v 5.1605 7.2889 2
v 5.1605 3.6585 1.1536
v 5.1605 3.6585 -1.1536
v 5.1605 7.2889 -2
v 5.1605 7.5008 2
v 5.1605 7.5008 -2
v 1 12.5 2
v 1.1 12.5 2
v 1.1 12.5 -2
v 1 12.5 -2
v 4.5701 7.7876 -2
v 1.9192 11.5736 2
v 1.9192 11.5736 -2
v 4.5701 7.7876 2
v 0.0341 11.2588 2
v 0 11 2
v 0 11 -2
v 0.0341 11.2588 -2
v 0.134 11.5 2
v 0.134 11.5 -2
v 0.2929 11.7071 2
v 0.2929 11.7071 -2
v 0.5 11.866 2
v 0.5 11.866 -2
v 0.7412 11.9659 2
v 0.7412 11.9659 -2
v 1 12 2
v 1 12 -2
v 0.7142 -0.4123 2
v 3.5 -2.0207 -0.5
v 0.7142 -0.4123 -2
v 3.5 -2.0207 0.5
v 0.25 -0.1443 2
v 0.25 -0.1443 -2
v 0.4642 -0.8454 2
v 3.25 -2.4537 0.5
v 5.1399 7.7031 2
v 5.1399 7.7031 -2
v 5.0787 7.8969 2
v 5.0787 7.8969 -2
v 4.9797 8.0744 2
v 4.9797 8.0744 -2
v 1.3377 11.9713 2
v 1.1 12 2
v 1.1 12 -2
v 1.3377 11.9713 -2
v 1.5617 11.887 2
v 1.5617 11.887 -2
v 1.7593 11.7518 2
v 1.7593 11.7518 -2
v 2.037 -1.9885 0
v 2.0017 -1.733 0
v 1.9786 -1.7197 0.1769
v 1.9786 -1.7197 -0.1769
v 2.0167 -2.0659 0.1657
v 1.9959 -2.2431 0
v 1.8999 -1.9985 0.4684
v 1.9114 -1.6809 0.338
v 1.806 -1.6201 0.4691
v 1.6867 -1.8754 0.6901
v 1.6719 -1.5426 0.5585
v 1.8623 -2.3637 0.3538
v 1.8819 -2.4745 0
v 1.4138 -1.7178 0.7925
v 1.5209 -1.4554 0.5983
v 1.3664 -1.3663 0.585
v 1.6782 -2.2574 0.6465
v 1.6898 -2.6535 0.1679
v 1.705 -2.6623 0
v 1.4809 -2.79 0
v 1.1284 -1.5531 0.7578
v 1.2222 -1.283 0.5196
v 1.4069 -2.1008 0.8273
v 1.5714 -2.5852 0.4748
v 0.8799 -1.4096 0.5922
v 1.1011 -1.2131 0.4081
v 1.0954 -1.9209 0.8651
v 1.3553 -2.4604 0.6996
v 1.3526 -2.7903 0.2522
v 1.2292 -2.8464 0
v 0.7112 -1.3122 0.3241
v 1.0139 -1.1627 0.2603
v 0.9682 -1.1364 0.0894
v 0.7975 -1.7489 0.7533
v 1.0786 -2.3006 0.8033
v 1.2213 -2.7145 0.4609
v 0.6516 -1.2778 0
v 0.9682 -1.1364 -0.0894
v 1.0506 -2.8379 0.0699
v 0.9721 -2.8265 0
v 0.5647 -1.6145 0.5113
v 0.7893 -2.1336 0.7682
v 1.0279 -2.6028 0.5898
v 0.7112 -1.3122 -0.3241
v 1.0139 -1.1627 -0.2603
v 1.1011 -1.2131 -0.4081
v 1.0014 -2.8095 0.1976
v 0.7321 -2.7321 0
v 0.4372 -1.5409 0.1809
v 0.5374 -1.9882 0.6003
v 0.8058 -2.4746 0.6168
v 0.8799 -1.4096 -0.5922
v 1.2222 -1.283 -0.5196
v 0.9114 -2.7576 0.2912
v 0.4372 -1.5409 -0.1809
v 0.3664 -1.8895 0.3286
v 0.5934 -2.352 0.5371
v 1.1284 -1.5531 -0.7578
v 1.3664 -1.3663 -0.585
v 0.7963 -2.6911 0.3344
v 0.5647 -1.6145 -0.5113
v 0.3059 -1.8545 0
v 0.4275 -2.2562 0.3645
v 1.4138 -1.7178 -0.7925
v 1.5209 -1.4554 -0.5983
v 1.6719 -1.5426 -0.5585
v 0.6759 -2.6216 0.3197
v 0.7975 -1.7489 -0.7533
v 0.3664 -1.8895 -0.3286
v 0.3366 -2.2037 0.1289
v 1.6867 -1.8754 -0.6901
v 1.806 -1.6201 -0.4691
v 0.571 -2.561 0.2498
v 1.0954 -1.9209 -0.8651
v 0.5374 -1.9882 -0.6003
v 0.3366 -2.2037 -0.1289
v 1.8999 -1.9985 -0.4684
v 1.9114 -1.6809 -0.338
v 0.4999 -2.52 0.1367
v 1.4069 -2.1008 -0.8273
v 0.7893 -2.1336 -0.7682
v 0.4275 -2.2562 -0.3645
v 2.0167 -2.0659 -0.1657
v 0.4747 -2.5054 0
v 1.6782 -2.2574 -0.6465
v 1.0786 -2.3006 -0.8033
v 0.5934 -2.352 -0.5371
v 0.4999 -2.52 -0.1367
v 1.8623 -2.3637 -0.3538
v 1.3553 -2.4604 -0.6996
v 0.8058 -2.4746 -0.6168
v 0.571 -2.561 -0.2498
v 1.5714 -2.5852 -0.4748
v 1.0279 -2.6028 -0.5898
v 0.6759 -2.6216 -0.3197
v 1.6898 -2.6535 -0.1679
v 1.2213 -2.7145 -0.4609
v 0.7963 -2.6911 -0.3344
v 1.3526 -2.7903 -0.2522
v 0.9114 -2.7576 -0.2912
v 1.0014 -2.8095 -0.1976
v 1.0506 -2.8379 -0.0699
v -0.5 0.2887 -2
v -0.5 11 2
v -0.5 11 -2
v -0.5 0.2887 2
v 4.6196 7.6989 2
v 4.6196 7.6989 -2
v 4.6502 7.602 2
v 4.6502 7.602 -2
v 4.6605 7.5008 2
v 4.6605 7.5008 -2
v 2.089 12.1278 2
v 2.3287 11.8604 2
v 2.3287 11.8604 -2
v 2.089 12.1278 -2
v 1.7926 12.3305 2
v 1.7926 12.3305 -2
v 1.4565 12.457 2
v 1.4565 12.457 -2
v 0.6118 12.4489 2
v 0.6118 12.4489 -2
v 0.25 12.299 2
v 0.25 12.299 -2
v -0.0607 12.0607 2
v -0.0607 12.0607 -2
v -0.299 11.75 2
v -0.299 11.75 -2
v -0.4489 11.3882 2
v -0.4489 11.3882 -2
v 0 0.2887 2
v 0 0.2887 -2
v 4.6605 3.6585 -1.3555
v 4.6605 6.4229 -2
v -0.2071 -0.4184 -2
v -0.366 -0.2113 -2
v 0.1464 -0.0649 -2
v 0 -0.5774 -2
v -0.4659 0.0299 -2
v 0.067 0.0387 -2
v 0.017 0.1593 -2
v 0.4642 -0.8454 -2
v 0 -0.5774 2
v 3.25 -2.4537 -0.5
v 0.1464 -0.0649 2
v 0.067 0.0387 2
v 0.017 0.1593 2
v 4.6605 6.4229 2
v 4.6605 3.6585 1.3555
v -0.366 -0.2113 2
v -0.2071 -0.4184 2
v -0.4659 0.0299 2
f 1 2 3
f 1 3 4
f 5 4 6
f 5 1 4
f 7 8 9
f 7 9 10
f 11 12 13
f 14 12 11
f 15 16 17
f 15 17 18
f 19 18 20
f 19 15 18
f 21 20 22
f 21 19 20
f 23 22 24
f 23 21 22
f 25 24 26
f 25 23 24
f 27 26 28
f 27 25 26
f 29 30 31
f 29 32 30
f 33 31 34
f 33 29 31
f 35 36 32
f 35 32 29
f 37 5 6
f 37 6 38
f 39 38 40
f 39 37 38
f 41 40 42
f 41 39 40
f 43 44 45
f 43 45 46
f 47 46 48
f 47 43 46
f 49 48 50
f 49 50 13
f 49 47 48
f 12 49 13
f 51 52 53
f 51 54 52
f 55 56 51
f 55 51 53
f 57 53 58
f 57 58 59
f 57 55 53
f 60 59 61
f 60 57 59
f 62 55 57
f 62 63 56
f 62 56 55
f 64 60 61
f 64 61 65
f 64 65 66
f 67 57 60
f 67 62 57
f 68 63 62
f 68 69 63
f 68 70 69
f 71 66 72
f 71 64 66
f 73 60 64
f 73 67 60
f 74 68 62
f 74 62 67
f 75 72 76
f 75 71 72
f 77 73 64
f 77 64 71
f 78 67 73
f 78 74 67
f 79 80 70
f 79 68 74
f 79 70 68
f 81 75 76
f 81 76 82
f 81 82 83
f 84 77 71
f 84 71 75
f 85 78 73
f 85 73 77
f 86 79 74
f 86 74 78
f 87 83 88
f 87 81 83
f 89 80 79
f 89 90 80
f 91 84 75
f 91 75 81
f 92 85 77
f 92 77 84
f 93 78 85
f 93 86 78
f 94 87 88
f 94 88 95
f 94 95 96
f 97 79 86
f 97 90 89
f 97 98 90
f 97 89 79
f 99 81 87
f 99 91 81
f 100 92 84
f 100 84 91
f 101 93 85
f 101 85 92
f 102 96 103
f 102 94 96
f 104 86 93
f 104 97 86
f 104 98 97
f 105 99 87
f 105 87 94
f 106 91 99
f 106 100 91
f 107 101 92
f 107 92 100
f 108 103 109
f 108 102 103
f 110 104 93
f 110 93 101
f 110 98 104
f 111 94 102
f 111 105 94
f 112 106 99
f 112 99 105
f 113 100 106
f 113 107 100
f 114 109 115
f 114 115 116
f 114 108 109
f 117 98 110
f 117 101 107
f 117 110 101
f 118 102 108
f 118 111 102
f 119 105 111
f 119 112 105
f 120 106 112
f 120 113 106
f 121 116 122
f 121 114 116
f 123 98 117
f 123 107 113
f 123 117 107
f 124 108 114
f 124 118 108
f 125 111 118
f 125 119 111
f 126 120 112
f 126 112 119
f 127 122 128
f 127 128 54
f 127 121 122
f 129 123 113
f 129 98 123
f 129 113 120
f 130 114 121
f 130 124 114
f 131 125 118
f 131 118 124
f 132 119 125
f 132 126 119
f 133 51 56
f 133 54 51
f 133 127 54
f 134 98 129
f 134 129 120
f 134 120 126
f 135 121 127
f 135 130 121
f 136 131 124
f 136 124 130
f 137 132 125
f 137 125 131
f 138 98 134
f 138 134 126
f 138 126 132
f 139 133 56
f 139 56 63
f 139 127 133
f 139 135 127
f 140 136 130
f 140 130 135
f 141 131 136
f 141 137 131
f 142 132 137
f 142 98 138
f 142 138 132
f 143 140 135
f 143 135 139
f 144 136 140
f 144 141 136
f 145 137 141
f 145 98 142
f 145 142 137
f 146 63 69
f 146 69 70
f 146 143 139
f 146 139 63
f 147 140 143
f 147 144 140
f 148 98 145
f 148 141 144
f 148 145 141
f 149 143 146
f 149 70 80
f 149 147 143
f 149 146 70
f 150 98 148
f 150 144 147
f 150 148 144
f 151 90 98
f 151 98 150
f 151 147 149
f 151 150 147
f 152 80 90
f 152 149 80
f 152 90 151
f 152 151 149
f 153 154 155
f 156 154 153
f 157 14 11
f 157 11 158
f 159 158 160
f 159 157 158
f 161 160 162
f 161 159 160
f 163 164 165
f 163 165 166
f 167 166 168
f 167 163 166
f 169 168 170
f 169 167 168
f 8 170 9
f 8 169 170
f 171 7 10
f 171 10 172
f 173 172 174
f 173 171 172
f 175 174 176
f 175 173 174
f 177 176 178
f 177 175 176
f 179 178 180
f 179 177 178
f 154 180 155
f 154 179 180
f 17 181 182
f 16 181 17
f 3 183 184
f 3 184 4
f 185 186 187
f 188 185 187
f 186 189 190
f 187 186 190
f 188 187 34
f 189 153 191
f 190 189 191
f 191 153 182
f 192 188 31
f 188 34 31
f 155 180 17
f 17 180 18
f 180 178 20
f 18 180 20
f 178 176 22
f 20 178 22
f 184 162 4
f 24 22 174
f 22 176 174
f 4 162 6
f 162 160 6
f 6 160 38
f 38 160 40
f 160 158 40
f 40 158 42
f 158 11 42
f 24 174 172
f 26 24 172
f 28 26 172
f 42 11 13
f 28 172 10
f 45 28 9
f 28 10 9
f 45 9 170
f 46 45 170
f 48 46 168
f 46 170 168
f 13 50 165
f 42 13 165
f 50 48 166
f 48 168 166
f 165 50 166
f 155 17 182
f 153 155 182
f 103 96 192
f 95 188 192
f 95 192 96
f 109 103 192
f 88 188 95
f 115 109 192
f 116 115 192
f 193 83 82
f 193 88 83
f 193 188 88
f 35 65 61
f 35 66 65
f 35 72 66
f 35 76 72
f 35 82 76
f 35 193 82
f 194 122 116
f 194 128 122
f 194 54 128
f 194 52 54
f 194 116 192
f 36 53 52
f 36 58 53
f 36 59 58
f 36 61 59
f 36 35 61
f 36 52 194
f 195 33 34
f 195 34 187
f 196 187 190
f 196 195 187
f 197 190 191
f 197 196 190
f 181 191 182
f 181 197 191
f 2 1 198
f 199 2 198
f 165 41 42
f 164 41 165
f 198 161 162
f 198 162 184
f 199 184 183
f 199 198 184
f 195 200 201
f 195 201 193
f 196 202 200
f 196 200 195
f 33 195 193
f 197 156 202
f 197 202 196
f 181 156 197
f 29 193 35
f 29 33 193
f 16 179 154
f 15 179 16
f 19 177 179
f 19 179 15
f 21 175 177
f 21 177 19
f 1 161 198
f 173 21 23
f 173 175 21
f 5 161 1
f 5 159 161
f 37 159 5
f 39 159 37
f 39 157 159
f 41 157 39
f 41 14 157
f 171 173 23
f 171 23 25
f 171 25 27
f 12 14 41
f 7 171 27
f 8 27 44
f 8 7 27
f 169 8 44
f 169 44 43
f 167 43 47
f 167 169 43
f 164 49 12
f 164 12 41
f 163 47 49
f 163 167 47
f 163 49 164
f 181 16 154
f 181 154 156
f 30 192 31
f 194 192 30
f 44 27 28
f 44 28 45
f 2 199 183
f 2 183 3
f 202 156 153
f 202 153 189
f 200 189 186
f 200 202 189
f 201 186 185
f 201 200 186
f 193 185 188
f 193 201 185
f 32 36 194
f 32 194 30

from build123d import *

# Parameters (mm, degrees)
EXTRUDE_THIN1_DEPTH     = 2
CUT_EXTRUDE1_DEPTH      = 14.670442165
CUT_EXTRUDE1_DEPTH_BACK = 14.670442165


with BuildPart() as part:
    # Sketch1 → Extrude-Thin1 (new, symmetric)
    with BuildSketch(Plane.XY):
        with BuildLine():
            Line((3.5, -2.020725942), (0.25, -0.144337567))
            ThreePointArc((0.25, -0.144337567), (0.066987298, 0.038675135), (0, 0.288675135))
            Line((0, 0.288675135), (0, 11))
            ThreePointArc((0, 11), (0.292893219, 11.707106781), (1, 12))
            Line((1, 12), (1.1, 12))
            ThreePointArc((1.1, 12), (1.561748613, 11.887010833), (1.919152044, 11.573576436))
            Line((1.919152044, 11.573576436), (4.570098185, 7.787632989))
            ThreePointArc((4.570098185, 7.787632989), (4.637380639, 7.651197671), (4.660522163, 7.500844771))
            Line((4.660522163, 7.500844771), (4.660522163, 3.658494165))
            Line((4.660522163, 3.658494165), (5.160522163, 3.658494165))
            Line((5.160522163, 3.658494165), (5.160522163, 7.500844771))
            ThreePointArc((5.160522163, 7.500844771), (5.114239114, 7.80155057), (4.979674208, 8.074421207))
            Line((4.979674208, 8.074421207), (2.328728066, 11.860364655))
            ThreePointArc((2.328728066, 11.860364655), (1.79262292, 12.33051625), (1.1, 12.5))
            Line((1.1, 12.5), (1, 12.5))
            ThreePointArc((1, 12.5), (-0.060660172, 12.060660172), (-0.5, 11))
            Line((-0.5, 11), (-0.5, 0.288675135))
            ThreePointArc((-0.5, 0.288675135), (-0.366025404, -0.211324865), (0, -0.577350269))
            Line((0, -0.577350269), (3.25, -2.453738644))
            Line((3.25, -2.453738644), (3.5, -2.020725942))
        make_face()
    extrude(amount=EXTRUDE_THIN1_DEPTH, both=True)

    # Sketch3 → Cut-Extrude1 (cut, two sides: drawn at the far end of the back side and taken through both)
    with BuildSketch(Plane(origin=(0, 0, 0), x_dir=(0.8660254037844364, -0.500000000000004, 0), z_dir=(0.500000000000004, 0.8660254037844364, 0)).offset(-CUT_EXTRUDE1_DEPTH_BACK)):
        Polygon((33.065052182, 13.033927086), (4.041451884, -0.5), (0.824691504, -2), (0.824691504, -2.582001287), (5.059767422, -2.582001287), (5.059767422, 2.96154049), (0.824691504, 2.96154049), (0.824691504, 2), (4.041451884, 0.5), (33.065052182, -13.033927086), (97.113051575, -13.033927086), (97.113051575, 13.033927086), align=None)
    extrude(amount=CUT_EXTRUDE1_DEPTH + CUT_EXTRUDE1_DEPTH_BACK, mode=Mode.SUBTRACT)

    # Sketch6 → Revolve1 (revolve)
    with BuildSketch(Plane.XY):
        with BuildLine():
            Line((1.482050808, -1.433012702), (2.00166605, -1.733012702))
            ThreePointArc((2.00166605, -1.733012702), (1.705049292, -2.662317438), (0.732050808, -2.732050808))
            Line((0.732050808, -2.732050808), (1.482050808, -1.433012702))
        make_face()
    revolve(axis=Axis((1.482050808, -1.433012702, 0), (-0.5000000000000001, -0.8660254037844387, 0)))


solid = part.part
